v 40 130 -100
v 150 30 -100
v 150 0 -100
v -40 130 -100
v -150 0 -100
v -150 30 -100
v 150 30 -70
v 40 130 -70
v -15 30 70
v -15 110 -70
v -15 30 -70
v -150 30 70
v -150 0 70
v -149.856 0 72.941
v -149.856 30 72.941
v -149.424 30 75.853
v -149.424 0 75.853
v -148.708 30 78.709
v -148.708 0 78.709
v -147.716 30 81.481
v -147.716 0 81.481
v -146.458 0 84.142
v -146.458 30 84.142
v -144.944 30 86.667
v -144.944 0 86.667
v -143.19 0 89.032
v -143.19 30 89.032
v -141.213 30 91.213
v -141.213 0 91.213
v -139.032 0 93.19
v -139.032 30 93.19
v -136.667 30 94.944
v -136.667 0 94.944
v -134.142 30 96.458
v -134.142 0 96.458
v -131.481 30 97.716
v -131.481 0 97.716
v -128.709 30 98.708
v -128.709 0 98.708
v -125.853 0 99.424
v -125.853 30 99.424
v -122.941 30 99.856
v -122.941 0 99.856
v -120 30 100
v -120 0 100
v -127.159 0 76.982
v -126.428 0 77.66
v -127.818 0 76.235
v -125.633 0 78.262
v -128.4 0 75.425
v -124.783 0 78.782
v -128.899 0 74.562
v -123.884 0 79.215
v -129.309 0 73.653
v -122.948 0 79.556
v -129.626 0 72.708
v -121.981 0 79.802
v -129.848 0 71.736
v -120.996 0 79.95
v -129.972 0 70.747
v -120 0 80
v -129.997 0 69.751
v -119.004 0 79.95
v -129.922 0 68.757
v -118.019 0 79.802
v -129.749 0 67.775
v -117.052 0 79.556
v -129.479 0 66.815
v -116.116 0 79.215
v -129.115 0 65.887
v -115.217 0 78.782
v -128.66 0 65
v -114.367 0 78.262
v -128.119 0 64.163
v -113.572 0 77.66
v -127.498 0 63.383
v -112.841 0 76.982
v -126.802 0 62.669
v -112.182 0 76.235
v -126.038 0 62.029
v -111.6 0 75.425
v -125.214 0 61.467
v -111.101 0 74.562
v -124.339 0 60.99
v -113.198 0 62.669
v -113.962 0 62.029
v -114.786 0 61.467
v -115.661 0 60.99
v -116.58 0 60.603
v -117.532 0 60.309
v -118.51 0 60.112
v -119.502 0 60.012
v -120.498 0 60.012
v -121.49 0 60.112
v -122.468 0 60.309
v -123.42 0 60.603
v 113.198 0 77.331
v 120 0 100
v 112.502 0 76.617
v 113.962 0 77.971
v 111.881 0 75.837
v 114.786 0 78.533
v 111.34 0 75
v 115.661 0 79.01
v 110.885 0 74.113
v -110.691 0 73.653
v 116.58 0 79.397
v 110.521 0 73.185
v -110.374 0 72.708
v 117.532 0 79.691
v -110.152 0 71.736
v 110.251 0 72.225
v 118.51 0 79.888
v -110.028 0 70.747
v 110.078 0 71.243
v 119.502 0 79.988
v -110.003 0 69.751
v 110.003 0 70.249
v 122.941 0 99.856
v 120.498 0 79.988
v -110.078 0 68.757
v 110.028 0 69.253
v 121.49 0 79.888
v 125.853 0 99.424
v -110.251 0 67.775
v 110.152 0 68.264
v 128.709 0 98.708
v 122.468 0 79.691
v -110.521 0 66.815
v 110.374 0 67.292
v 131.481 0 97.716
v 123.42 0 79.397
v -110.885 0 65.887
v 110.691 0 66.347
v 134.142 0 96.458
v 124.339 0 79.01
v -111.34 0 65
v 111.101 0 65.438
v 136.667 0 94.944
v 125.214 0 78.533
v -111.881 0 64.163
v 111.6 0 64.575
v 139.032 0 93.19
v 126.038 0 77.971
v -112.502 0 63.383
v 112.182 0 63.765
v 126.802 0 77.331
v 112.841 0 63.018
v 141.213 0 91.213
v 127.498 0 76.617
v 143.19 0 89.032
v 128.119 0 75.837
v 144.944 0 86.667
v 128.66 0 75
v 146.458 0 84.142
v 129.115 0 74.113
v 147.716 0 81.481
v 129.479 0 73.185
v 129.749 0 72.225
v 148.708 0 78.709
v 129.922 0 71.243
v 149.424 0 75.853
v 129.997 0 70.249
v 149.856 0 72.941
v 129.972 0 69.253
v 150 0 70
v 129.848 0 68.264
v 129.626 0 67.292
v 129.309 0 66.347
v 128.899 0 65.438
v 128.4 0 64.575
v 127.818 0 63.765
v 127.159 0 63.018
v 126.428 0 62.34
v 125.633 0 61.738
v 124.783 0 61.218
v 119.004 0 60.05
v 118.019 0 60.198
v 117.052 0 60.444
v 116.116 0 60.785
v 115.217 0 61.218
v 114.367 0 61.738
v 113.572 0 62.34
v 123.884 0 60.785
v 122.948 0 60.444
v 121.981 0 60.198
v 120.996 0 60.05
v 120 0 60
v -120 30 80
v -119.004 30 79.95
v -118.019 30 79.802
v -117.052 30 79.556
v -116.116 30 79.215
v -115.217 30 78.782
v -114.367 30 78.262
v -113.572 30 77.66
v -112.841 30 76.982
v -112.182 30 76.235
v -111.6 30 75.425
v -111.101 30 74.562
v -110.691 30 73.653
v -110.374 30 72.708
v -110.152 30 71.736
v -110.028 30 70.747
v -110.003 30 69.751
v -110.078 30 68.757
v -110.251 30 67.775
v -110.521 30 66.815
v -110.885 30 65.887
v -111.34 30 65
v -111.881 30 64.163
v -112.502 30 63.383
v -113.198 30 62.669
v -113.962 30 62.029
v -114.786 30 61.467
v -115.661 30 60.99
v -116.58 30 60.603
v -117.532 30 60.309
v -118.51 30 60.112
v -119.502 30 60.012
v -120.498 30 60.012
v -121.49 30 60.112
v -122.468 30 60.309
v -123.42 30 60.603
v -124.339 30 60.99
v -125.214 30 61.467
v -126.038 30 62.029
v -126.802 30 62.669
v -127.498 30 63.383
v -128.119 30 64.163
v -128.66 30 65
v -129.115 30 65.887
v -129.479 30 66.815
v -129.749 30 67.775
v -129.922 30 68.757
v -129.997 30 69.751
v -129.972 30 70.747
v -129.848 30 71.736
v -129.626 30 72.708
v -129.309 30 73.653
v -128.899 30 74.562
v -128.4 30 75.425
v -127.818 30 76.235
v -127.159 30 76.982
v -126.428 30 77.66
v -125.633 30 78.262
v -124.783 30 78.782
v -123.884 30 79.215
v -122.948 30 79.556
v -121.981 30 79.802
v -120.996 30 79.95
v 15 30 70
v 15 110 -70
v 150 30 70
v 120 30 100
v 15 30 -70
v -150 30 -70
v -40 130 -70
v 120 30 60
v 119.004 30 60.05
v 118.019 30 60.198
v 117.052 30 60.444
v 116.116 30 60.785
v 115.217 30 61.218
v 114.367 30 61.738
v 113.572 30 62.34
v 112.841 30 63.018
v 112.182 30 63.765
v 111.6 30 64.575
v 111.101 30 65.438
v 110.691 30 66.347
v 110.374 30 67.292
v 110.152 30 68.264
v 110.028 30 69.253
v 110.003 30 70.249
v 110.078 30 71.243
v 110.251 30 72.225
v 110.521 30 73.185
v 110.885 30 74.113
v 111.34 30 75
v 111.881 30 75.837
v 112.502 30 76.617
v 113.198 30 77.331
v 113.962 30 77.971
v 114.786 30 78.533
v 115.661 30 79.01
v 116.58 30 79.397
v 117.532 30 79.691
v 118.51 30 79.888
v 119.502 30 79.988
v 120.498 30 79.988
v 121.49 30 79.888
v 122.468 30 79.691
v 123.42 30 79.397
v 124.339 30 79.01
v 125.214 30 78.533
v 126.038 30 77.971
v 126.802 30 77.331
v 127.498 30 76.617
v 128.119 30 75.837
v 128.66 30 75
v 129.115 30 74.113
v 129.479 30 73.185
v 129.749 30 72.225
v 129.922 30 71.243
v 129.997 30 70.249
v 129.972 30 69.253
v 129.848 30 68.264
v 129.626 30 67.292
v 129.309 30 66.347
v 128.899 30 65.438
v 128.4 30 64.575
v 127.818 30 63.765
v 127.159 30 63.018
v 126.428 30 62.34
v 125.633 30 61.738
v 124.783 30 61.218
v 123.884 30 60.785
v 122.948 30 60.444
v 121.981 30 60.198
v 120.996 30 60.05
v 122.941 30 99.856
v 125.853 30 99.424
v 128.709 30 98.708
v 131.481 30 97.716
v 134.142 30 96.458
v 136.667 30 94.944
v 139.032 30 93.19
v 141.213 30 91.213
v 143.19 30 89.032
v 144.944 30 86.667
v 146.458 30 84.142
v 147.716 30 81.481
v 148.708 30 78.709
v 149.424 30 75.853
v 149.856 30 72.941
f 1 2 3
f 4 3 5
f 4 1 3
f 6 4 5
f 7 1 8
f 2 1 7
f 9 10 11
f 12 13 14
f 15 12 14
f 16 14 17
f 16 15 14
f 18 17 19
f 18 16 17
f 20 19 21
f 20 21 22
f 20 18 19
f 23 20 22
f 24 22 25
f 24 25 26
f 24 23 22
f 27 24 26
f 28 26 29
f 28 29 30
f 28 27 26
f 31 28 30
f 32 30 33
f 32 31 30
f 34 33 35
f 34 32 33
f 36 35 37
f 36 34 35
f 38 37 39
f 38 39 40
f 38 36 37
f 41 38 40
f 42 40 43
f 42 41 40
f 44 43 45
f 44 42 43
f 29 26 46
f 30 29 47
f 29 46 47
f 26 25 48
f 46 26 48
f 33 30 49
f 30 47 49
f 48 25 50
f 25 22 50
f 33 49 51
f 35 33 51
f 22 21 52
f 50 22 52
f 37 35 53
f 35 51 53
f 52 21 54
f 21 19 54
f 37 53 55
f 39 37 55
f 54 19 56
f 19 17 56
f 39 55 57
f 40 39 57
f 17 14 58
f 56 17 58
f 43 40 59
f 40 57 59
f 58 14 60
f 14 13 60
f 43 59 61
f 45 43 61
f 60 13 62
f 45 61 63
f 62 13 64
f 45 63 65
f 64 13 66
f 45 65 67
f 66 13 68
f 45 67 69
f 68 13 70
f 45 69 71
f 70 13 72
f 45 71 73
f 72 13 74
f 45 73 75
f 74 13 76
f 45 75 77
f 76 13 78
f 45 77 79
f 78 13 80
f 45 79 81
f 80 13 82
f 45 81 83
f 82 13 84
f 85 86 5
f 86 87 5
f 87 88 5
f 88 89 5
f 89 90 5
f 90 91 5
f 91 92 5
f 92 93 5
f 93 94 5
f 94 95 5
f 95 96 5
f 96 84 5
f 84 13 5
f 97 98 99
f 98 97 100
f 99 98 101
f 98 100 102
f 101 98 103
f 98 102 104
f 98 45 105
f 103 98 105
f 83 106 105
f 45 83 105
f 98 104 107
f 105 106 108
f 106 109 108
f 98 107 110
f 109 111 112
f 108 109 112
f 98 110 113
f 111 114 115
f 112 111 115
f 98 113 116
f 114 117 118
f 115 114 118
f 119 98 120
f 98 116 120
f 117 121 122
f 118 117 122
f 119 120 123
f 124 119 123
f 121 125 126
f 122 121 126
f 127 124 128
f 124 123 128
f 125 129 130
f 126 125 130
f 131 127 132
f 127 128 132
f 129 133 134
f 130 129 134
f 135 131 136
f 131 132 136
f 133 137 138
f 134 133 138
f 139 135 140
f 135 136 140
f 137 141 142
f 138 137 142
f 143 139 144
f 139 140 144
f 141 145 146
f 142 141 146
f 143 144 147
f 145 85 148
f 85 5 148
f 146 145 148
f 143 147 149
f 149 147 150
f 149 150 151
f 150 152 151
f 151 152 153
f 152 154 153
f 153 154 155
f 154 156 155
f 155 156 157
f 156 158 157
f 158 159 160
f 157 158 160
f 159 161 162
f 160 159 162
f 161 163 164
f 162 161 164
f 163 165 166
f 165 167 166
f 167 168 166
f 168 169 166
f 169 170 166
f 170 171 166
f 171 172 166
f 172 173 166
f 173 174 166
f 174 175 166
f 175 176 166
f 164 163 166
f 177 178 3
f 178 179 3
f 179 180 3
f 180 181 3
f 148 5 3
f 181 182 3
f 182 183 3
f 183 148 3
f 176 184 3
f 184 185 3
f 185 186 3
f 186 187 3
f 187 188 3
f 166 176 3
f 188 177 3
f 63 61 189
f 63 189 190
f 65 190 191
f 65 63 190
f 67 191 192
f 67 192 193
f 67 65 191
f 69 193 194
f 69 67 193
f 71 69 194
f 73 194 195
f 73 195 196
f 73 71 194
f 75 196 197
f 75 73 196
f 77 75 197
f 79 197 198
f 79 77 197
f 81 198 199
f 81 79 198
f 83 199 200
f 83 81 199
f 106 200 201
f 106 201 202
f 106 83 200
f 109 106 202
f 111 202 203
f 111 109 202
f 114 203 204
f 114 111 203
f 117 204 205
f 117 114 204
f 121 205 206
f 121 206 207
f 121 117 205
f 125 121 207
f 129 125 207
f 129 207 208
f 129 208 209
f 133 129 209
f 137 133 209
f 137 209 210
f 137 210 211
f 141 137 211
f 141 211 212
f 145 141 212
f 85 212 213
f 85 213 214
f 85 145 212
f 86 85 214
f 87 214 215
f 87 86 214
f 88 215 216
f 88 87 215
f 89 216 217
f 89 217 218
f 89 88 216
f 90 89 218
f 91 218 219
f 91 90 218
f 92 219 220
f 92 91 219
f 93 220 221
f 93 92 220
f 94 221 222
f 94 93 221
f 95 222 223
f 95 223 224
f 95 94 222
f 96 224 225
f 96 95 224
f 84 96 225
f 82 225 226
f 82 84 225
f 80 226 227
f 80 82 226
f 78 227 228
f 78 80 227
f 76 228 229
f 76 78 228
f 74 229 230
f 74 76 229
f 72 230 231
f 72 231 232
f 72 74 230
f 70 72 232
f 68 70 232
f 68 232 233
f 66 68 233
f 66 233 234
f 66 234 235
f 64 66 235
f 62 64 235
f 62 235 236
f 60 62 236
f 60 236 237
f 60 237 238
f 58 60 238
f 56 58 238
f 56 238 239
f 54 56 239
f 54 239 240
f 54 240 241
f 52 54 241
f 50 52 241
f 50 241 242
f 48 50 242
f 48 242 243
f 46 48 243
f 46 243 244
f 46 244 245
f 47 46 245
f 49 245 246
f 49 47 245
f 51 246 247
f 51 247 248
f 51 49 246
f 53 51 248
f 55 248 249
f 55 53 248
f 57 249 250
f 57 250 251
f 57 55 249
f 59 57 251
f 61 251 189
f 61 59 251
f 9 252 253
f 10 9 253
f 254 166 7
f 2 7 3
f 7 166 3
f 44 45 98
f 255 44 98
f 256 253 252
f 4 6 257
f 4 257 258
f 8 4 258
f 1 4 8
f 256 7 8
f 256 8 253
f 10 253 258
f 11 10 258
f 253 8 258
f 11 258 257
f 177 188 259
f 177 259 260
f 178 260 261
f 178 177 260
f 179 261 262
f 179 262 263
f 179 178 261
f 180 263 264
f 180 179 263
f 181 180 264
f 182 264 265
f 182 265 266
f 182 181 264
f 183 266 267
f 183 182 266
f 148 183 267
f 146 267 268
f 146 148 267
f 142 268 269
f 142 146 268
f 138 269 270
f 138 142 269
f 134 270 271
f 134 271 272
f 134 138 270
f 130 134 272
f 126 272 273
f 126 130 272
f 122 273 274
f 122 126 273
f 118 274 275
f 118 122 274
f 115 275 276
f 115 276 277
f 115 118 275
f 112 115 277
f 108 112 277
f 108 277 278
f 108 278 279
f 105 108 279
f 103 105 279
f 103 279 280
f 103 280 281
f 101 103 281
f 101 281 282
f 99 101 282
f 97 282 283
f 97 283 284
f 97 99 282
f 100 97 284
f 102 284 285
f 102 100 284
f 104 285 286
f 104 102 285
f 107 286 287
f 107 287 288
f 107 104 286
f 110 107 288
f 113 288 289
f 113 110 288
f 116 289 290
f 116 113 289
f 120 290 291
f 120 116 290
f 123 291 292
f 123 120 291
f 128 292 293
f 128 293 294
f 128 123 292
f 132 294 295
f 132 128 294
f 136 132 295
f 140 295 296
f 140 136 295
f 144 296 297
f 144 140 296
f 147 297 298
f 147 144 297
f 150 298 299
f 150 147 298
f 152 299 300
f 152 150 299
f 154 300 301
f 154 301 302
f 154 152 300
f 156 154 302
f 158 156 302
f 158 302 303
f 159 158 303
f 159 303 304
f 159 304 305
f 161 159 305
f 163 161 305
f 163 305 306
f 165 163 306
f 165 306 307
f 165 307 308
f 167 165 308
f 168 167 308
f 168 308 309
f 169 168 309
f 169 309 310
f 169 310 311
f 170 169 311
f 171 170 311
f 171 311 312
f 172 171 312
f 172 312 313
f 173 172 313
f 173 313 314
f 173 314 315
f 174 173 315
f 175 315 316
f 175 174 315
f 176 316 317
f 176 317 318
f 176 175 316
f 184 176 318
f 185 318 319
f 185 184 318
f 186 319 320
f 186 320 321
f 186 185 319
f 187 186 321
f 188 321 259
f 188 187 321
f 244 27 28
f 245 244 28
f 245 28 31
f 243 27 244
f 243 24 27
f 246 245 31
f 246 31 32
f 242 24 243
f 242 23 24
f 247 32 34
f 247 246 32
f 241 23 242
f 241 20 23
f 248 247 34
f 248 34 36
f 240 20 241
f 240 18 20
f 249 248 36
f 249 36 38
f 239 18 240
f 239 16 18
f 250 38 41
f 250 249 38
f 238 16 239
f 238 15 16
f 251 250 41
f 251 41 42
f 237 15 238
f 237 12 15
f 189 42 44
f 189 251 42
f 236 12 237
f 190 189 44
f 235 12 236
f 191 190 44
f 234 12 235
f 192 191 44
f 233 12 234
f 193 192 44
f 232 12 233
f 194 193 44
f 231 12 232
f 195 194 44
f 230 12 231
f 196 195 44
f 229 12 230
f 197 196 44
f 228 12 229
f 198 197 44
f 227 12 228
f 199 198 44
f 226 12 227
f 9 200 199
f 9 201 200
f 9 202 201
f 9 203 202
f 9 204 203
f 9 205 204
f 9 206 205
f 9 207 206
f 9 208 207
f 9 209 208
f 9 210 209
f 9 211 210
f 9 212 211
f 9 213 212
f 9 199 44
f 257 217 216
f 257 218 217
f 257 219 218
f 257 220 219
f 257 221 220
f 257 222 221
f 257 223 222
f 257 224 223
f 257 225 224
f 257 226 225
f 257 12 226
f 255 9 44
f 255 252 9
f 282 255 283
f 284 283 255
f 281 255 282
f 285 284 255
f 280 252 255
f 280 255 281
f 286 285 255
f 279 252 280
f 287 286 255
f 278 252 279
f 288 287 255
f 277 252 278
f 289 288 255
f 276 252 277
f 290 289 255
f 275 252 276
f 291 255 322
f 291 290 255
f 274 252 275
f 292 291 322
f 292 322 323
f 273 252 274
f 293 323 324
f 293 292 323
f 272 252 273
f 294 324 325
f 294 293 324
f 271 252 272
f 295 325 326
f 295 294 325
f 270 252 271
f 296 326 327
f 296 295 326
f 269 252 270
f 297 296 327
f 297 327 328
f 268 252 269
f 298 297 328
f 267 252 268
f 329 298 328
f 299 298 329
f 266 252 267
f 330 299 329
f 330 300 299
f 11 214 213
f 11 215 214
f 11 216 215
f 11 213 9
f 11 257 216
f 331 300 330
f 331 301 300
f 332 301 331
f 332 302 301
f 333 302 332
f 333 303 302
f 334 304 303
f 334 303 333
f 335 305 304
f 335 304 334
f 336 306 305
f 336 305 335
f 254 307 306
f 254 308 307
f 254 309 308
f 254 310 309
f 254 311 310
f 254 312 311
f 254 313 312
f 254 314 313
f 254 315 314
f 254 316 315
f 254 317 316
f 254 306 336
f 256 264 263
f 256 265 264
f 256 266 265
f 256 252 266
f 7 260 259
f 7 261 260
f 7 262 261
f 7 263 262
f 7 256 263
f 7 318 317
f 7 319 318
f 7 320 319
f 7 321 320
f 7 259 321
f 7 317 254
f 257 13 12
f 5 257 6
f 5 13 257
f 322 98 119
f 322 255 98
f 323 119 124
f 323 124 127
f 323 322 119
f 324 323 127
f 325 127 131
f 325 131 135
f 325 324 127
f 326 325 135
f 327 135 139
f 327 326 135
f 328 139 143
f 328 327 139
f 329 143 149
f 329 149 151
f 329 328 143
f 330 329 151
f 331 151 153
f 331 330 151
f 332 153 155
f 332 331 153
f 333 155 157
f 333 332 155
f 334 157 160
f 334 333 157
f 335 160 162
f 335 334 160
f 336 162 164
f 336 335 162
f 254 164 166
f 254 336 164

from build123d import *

# Parameters (mm, degrees)
SKETCH_3_W          = 299.999999948
SKETCH_3_H          = 200.00000005
EXTRUDE_1_DEPTH     = 30
FILLET_1_R          = 30
FILLET_2_R          = 30
EXTRUDE_2_DEPTH     = 30
SKETCH_4_R          = 10
CUT_EXTRUDE_1_DEPTH = 30
EXTRUDE_3_DEPTH     = 15


with BuildPart() as part:
    # 草图3 → 凸台-拉伸1 (new body)
    with BuildSketch(Plane(origin=(0, 0, 0), x_dir=(1, 0, 0), z_dir=(0, 1, 0))):
        Rectangle(SKETCH_3_W, SKETCH_3_H)
    extrude(amount=EXTRUDE_1_DEPTH)

    # 圆角1
    fillet_1_edges = [part.edges().sort_by_distance(p)[0] for p in [
        (-149.999999974, 15, 100.000000025),
    ]]
    fillet(fillet_1_edges, radius=FILLET_1_R)

    # 圆角2
    fillet_2_edges = [part.edges().sort_by_distance(p)[0] for p in [
        (149.999999974, 15, 100.000000025),
    ]]
    fillet(fillet_2_edges, radius=FILLET_2_R)

    # 草图5 → 凸台-拉伸2 (add)
    with BuildSketch(Plane(origin=(0, 0, -100.000000025), x_dir=(-1, 0, 0), z_dir=(0, 0, -1))):
        Polygon((-149.999999974, 30), (149.999999974, 30), (40, 130), (-40, 130), align=None)
    extrude(amount=-EXTRUDE_2_DEPTH)

    # 草图4 → 切除-拉伸1 (cut)
    with BuildSketch(Plane(origin=(0, 0, 0), x_dir=(1, 0, 0), z_dir=(0, 1, 0))):
        with Locations(Location((-119.999999974, -70.000000025, 0), (0, 0, 270))):
            Circle(SKETCH_4_R)
        with Locations(Location((119.999999974, -70.000000025, 0), (0, 0, 90))):
            Circle(SKETCH_4_R)
    extrude(amount=CUT_EXTRUDE_1_DEPTH, mode=Mode.SUBTRACT)

    # 草图7 → 凸台-拉伸3 (add, symmetric)
    with BuildSketch(Plane(origin=(0, 0, 0), x_dir=(0, 0, -1), z_dir=(1, 0, 0))):
        Polygon((-70.000000025, 30), (70.000000025, 110), (70.000000025, 30), align=None)
    extrude(amount=EXTRUDE_3_DEPTH, both=True)


solid = part.part
